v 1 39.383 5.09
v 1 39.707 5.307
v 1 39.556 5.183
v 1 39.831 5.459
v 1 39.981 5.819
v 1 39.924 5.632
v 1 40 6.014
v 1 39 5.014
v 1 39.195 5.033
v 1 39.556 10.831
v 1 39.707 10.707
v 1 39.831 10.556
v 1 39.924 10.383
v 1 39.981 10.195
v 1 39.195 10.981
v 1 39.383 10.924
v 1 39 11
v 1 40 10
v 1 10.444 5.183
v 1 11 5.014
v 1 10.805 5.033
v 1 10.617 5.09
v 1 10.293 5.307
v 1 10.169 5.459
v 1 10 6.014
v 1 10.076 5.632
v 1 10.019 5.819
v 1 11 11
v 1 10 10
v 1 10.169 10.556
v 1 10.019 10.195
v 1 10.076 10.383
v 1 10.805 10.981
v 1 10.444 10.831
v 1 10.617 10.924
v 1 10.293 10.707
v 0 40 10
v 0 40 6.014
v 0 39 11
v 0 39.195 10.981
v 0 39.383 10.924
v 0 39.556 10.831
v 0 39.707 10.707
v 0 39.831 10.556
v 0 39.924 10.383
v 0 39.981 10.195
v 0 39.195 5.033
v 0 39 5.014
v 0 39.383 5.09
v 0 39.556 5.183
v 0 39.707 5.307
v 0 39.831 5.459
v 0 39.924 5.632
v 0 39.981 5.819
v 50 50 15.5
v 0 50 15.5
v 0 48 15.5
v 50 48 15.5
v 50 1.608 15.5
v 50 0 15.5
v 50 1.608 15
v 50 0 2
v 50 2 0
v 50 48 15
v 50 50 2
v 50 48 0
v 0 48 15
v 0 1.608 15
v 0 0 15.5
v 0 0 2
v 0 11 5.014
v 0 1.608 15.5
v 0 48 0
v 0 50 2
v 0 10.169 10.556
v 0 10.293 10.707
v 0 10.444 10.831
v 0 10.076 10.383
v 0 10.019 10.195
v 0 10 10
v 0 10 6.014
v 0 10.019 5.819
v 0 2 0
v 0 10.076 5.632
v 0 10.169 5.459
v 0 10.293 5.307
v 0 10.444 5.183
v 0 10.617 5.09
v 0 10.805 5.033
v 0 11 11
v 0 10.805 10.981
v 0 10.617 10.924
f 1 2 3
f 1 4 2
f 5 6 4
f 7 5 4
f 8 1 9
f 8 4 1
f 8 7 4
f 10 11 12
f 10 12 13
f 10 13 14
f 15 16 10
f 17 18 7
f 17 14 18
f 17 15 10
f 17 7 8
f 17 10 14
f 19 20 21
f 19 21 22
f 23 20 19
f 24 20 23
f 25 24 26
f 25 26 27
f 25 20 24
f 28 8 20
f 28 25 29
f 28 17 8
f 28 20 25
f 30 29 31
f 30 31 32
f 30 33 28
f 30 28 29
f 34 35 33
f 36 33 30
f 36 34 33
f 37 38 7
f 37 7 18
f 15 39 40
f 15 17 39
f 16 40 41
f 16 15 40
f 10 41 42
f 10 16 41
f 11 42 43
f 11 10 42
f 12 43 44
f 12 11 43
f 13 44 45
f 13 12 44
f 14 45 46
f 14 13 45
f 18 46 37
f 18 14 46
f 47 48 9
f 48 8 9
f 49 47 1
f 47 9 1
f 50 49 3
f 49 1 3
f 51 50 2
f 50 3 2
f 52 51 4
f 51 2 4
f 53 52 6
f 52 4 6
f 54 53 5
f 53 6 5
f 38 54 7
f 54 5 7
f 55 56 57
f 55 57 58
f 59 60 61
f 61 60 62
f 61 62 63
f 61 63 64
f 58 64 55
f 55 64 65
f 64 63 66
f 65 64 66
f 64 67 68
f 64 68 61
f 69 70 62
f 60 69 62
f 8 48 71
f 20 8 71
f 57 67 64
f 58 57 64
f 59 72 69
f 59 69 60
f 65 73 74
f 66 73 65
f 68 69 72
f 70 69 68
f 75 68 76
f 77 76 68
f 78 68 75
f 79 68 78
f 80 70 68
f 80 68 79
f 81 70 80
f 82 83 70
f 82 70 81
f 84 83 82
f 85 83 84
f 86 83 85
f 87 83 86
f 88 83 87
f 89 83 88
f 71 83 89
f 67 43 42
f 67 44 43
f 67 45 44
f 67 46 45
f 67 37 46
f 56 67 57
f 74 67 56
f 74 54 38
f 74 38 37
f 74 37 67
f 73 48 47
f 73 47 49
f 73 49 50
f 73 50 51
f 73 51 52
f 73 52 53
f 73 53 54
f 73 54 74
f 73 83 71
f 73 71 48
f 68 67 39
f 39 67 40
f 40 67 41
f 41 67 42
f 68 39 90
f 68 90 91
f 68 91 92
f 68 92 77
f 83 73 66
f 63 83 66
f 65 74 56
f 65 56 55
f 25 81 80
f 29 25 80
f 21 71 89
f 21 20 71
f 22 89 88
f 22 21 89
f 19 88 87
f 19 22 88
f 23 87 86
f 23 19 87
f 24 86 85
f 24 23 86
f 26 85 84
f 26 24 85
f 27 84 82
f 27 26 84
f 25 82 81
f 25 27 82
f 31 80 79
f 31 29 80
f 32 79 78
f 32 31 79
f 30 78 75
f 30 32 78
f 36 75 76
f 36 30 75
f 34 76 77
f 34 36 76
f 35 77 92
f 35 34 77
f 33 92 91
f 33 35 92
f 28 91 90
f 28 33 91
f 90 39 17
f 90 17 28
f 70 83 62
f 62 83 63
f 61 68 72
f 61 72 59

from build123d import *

# Parameters (mm, degrees)
F0_W     = 50
F0_H     = 50
F1_DEPTH = 15
F2_SIZE  = 2
F3_W     = 30
F3_H     = 5.985749
F4_DEPTH = 1
F5_R     = 1
F6_W     = 50
F6_H     = 2
F6_H_2   = 1.608082
F7_DEPTH = 0.5


with BuildPart() as f1:
    # F0 (on Top) → F1 (new body)
    with BuildSketch(Plane.XY):
        with Locations((25, 25)):
            Rectangle(F0_W, F0_H)
    extrude(amount=F1_DEPTH)

    # F2
    f2_edges = [f1.edges().sort_by_distance(p)[0] for p in [
        (25, 0, 0),
        (25, 50, 0),
    ]]
    chamfer(f2_edges, length=F2_SIZE)

    # F3 (on face) → F4 (cut)
    with BuildSketch(Plane(origin=(0, 0, 0), x_dir=(0, -1, 0), z_dir=(-1, 0, 0))):
        with Locations((-25, 8.007126)):
            Rectangle(F3_W, F3_H)
    extrude(amount=-F4_DEPTH, mode=Mode.SUBTRACT)

    # F5
    f5_edges = [f1.edges().sort_by_distance(p)[0] for p in [
        (0.5, 40, 11),
        (0.5, 40, 5.014251),
        (0.5, 10, 11),
        (0.5, 10, 5.014251),
    ]]
    fillet(f5_edges, radius=F5_R)

    # F6 (on face) → F7 (join)
    with BuildSketch(Plane.XY.offset(15)):
        with Locations((25, 49)):
            Rectangle(F6_W, F6_H)
        with Locations((25, 0.804041)):
            Rectangle(F6_W, F6_H_2)
    extrude(amount=F7_DEPTH)


solid = f1.part
